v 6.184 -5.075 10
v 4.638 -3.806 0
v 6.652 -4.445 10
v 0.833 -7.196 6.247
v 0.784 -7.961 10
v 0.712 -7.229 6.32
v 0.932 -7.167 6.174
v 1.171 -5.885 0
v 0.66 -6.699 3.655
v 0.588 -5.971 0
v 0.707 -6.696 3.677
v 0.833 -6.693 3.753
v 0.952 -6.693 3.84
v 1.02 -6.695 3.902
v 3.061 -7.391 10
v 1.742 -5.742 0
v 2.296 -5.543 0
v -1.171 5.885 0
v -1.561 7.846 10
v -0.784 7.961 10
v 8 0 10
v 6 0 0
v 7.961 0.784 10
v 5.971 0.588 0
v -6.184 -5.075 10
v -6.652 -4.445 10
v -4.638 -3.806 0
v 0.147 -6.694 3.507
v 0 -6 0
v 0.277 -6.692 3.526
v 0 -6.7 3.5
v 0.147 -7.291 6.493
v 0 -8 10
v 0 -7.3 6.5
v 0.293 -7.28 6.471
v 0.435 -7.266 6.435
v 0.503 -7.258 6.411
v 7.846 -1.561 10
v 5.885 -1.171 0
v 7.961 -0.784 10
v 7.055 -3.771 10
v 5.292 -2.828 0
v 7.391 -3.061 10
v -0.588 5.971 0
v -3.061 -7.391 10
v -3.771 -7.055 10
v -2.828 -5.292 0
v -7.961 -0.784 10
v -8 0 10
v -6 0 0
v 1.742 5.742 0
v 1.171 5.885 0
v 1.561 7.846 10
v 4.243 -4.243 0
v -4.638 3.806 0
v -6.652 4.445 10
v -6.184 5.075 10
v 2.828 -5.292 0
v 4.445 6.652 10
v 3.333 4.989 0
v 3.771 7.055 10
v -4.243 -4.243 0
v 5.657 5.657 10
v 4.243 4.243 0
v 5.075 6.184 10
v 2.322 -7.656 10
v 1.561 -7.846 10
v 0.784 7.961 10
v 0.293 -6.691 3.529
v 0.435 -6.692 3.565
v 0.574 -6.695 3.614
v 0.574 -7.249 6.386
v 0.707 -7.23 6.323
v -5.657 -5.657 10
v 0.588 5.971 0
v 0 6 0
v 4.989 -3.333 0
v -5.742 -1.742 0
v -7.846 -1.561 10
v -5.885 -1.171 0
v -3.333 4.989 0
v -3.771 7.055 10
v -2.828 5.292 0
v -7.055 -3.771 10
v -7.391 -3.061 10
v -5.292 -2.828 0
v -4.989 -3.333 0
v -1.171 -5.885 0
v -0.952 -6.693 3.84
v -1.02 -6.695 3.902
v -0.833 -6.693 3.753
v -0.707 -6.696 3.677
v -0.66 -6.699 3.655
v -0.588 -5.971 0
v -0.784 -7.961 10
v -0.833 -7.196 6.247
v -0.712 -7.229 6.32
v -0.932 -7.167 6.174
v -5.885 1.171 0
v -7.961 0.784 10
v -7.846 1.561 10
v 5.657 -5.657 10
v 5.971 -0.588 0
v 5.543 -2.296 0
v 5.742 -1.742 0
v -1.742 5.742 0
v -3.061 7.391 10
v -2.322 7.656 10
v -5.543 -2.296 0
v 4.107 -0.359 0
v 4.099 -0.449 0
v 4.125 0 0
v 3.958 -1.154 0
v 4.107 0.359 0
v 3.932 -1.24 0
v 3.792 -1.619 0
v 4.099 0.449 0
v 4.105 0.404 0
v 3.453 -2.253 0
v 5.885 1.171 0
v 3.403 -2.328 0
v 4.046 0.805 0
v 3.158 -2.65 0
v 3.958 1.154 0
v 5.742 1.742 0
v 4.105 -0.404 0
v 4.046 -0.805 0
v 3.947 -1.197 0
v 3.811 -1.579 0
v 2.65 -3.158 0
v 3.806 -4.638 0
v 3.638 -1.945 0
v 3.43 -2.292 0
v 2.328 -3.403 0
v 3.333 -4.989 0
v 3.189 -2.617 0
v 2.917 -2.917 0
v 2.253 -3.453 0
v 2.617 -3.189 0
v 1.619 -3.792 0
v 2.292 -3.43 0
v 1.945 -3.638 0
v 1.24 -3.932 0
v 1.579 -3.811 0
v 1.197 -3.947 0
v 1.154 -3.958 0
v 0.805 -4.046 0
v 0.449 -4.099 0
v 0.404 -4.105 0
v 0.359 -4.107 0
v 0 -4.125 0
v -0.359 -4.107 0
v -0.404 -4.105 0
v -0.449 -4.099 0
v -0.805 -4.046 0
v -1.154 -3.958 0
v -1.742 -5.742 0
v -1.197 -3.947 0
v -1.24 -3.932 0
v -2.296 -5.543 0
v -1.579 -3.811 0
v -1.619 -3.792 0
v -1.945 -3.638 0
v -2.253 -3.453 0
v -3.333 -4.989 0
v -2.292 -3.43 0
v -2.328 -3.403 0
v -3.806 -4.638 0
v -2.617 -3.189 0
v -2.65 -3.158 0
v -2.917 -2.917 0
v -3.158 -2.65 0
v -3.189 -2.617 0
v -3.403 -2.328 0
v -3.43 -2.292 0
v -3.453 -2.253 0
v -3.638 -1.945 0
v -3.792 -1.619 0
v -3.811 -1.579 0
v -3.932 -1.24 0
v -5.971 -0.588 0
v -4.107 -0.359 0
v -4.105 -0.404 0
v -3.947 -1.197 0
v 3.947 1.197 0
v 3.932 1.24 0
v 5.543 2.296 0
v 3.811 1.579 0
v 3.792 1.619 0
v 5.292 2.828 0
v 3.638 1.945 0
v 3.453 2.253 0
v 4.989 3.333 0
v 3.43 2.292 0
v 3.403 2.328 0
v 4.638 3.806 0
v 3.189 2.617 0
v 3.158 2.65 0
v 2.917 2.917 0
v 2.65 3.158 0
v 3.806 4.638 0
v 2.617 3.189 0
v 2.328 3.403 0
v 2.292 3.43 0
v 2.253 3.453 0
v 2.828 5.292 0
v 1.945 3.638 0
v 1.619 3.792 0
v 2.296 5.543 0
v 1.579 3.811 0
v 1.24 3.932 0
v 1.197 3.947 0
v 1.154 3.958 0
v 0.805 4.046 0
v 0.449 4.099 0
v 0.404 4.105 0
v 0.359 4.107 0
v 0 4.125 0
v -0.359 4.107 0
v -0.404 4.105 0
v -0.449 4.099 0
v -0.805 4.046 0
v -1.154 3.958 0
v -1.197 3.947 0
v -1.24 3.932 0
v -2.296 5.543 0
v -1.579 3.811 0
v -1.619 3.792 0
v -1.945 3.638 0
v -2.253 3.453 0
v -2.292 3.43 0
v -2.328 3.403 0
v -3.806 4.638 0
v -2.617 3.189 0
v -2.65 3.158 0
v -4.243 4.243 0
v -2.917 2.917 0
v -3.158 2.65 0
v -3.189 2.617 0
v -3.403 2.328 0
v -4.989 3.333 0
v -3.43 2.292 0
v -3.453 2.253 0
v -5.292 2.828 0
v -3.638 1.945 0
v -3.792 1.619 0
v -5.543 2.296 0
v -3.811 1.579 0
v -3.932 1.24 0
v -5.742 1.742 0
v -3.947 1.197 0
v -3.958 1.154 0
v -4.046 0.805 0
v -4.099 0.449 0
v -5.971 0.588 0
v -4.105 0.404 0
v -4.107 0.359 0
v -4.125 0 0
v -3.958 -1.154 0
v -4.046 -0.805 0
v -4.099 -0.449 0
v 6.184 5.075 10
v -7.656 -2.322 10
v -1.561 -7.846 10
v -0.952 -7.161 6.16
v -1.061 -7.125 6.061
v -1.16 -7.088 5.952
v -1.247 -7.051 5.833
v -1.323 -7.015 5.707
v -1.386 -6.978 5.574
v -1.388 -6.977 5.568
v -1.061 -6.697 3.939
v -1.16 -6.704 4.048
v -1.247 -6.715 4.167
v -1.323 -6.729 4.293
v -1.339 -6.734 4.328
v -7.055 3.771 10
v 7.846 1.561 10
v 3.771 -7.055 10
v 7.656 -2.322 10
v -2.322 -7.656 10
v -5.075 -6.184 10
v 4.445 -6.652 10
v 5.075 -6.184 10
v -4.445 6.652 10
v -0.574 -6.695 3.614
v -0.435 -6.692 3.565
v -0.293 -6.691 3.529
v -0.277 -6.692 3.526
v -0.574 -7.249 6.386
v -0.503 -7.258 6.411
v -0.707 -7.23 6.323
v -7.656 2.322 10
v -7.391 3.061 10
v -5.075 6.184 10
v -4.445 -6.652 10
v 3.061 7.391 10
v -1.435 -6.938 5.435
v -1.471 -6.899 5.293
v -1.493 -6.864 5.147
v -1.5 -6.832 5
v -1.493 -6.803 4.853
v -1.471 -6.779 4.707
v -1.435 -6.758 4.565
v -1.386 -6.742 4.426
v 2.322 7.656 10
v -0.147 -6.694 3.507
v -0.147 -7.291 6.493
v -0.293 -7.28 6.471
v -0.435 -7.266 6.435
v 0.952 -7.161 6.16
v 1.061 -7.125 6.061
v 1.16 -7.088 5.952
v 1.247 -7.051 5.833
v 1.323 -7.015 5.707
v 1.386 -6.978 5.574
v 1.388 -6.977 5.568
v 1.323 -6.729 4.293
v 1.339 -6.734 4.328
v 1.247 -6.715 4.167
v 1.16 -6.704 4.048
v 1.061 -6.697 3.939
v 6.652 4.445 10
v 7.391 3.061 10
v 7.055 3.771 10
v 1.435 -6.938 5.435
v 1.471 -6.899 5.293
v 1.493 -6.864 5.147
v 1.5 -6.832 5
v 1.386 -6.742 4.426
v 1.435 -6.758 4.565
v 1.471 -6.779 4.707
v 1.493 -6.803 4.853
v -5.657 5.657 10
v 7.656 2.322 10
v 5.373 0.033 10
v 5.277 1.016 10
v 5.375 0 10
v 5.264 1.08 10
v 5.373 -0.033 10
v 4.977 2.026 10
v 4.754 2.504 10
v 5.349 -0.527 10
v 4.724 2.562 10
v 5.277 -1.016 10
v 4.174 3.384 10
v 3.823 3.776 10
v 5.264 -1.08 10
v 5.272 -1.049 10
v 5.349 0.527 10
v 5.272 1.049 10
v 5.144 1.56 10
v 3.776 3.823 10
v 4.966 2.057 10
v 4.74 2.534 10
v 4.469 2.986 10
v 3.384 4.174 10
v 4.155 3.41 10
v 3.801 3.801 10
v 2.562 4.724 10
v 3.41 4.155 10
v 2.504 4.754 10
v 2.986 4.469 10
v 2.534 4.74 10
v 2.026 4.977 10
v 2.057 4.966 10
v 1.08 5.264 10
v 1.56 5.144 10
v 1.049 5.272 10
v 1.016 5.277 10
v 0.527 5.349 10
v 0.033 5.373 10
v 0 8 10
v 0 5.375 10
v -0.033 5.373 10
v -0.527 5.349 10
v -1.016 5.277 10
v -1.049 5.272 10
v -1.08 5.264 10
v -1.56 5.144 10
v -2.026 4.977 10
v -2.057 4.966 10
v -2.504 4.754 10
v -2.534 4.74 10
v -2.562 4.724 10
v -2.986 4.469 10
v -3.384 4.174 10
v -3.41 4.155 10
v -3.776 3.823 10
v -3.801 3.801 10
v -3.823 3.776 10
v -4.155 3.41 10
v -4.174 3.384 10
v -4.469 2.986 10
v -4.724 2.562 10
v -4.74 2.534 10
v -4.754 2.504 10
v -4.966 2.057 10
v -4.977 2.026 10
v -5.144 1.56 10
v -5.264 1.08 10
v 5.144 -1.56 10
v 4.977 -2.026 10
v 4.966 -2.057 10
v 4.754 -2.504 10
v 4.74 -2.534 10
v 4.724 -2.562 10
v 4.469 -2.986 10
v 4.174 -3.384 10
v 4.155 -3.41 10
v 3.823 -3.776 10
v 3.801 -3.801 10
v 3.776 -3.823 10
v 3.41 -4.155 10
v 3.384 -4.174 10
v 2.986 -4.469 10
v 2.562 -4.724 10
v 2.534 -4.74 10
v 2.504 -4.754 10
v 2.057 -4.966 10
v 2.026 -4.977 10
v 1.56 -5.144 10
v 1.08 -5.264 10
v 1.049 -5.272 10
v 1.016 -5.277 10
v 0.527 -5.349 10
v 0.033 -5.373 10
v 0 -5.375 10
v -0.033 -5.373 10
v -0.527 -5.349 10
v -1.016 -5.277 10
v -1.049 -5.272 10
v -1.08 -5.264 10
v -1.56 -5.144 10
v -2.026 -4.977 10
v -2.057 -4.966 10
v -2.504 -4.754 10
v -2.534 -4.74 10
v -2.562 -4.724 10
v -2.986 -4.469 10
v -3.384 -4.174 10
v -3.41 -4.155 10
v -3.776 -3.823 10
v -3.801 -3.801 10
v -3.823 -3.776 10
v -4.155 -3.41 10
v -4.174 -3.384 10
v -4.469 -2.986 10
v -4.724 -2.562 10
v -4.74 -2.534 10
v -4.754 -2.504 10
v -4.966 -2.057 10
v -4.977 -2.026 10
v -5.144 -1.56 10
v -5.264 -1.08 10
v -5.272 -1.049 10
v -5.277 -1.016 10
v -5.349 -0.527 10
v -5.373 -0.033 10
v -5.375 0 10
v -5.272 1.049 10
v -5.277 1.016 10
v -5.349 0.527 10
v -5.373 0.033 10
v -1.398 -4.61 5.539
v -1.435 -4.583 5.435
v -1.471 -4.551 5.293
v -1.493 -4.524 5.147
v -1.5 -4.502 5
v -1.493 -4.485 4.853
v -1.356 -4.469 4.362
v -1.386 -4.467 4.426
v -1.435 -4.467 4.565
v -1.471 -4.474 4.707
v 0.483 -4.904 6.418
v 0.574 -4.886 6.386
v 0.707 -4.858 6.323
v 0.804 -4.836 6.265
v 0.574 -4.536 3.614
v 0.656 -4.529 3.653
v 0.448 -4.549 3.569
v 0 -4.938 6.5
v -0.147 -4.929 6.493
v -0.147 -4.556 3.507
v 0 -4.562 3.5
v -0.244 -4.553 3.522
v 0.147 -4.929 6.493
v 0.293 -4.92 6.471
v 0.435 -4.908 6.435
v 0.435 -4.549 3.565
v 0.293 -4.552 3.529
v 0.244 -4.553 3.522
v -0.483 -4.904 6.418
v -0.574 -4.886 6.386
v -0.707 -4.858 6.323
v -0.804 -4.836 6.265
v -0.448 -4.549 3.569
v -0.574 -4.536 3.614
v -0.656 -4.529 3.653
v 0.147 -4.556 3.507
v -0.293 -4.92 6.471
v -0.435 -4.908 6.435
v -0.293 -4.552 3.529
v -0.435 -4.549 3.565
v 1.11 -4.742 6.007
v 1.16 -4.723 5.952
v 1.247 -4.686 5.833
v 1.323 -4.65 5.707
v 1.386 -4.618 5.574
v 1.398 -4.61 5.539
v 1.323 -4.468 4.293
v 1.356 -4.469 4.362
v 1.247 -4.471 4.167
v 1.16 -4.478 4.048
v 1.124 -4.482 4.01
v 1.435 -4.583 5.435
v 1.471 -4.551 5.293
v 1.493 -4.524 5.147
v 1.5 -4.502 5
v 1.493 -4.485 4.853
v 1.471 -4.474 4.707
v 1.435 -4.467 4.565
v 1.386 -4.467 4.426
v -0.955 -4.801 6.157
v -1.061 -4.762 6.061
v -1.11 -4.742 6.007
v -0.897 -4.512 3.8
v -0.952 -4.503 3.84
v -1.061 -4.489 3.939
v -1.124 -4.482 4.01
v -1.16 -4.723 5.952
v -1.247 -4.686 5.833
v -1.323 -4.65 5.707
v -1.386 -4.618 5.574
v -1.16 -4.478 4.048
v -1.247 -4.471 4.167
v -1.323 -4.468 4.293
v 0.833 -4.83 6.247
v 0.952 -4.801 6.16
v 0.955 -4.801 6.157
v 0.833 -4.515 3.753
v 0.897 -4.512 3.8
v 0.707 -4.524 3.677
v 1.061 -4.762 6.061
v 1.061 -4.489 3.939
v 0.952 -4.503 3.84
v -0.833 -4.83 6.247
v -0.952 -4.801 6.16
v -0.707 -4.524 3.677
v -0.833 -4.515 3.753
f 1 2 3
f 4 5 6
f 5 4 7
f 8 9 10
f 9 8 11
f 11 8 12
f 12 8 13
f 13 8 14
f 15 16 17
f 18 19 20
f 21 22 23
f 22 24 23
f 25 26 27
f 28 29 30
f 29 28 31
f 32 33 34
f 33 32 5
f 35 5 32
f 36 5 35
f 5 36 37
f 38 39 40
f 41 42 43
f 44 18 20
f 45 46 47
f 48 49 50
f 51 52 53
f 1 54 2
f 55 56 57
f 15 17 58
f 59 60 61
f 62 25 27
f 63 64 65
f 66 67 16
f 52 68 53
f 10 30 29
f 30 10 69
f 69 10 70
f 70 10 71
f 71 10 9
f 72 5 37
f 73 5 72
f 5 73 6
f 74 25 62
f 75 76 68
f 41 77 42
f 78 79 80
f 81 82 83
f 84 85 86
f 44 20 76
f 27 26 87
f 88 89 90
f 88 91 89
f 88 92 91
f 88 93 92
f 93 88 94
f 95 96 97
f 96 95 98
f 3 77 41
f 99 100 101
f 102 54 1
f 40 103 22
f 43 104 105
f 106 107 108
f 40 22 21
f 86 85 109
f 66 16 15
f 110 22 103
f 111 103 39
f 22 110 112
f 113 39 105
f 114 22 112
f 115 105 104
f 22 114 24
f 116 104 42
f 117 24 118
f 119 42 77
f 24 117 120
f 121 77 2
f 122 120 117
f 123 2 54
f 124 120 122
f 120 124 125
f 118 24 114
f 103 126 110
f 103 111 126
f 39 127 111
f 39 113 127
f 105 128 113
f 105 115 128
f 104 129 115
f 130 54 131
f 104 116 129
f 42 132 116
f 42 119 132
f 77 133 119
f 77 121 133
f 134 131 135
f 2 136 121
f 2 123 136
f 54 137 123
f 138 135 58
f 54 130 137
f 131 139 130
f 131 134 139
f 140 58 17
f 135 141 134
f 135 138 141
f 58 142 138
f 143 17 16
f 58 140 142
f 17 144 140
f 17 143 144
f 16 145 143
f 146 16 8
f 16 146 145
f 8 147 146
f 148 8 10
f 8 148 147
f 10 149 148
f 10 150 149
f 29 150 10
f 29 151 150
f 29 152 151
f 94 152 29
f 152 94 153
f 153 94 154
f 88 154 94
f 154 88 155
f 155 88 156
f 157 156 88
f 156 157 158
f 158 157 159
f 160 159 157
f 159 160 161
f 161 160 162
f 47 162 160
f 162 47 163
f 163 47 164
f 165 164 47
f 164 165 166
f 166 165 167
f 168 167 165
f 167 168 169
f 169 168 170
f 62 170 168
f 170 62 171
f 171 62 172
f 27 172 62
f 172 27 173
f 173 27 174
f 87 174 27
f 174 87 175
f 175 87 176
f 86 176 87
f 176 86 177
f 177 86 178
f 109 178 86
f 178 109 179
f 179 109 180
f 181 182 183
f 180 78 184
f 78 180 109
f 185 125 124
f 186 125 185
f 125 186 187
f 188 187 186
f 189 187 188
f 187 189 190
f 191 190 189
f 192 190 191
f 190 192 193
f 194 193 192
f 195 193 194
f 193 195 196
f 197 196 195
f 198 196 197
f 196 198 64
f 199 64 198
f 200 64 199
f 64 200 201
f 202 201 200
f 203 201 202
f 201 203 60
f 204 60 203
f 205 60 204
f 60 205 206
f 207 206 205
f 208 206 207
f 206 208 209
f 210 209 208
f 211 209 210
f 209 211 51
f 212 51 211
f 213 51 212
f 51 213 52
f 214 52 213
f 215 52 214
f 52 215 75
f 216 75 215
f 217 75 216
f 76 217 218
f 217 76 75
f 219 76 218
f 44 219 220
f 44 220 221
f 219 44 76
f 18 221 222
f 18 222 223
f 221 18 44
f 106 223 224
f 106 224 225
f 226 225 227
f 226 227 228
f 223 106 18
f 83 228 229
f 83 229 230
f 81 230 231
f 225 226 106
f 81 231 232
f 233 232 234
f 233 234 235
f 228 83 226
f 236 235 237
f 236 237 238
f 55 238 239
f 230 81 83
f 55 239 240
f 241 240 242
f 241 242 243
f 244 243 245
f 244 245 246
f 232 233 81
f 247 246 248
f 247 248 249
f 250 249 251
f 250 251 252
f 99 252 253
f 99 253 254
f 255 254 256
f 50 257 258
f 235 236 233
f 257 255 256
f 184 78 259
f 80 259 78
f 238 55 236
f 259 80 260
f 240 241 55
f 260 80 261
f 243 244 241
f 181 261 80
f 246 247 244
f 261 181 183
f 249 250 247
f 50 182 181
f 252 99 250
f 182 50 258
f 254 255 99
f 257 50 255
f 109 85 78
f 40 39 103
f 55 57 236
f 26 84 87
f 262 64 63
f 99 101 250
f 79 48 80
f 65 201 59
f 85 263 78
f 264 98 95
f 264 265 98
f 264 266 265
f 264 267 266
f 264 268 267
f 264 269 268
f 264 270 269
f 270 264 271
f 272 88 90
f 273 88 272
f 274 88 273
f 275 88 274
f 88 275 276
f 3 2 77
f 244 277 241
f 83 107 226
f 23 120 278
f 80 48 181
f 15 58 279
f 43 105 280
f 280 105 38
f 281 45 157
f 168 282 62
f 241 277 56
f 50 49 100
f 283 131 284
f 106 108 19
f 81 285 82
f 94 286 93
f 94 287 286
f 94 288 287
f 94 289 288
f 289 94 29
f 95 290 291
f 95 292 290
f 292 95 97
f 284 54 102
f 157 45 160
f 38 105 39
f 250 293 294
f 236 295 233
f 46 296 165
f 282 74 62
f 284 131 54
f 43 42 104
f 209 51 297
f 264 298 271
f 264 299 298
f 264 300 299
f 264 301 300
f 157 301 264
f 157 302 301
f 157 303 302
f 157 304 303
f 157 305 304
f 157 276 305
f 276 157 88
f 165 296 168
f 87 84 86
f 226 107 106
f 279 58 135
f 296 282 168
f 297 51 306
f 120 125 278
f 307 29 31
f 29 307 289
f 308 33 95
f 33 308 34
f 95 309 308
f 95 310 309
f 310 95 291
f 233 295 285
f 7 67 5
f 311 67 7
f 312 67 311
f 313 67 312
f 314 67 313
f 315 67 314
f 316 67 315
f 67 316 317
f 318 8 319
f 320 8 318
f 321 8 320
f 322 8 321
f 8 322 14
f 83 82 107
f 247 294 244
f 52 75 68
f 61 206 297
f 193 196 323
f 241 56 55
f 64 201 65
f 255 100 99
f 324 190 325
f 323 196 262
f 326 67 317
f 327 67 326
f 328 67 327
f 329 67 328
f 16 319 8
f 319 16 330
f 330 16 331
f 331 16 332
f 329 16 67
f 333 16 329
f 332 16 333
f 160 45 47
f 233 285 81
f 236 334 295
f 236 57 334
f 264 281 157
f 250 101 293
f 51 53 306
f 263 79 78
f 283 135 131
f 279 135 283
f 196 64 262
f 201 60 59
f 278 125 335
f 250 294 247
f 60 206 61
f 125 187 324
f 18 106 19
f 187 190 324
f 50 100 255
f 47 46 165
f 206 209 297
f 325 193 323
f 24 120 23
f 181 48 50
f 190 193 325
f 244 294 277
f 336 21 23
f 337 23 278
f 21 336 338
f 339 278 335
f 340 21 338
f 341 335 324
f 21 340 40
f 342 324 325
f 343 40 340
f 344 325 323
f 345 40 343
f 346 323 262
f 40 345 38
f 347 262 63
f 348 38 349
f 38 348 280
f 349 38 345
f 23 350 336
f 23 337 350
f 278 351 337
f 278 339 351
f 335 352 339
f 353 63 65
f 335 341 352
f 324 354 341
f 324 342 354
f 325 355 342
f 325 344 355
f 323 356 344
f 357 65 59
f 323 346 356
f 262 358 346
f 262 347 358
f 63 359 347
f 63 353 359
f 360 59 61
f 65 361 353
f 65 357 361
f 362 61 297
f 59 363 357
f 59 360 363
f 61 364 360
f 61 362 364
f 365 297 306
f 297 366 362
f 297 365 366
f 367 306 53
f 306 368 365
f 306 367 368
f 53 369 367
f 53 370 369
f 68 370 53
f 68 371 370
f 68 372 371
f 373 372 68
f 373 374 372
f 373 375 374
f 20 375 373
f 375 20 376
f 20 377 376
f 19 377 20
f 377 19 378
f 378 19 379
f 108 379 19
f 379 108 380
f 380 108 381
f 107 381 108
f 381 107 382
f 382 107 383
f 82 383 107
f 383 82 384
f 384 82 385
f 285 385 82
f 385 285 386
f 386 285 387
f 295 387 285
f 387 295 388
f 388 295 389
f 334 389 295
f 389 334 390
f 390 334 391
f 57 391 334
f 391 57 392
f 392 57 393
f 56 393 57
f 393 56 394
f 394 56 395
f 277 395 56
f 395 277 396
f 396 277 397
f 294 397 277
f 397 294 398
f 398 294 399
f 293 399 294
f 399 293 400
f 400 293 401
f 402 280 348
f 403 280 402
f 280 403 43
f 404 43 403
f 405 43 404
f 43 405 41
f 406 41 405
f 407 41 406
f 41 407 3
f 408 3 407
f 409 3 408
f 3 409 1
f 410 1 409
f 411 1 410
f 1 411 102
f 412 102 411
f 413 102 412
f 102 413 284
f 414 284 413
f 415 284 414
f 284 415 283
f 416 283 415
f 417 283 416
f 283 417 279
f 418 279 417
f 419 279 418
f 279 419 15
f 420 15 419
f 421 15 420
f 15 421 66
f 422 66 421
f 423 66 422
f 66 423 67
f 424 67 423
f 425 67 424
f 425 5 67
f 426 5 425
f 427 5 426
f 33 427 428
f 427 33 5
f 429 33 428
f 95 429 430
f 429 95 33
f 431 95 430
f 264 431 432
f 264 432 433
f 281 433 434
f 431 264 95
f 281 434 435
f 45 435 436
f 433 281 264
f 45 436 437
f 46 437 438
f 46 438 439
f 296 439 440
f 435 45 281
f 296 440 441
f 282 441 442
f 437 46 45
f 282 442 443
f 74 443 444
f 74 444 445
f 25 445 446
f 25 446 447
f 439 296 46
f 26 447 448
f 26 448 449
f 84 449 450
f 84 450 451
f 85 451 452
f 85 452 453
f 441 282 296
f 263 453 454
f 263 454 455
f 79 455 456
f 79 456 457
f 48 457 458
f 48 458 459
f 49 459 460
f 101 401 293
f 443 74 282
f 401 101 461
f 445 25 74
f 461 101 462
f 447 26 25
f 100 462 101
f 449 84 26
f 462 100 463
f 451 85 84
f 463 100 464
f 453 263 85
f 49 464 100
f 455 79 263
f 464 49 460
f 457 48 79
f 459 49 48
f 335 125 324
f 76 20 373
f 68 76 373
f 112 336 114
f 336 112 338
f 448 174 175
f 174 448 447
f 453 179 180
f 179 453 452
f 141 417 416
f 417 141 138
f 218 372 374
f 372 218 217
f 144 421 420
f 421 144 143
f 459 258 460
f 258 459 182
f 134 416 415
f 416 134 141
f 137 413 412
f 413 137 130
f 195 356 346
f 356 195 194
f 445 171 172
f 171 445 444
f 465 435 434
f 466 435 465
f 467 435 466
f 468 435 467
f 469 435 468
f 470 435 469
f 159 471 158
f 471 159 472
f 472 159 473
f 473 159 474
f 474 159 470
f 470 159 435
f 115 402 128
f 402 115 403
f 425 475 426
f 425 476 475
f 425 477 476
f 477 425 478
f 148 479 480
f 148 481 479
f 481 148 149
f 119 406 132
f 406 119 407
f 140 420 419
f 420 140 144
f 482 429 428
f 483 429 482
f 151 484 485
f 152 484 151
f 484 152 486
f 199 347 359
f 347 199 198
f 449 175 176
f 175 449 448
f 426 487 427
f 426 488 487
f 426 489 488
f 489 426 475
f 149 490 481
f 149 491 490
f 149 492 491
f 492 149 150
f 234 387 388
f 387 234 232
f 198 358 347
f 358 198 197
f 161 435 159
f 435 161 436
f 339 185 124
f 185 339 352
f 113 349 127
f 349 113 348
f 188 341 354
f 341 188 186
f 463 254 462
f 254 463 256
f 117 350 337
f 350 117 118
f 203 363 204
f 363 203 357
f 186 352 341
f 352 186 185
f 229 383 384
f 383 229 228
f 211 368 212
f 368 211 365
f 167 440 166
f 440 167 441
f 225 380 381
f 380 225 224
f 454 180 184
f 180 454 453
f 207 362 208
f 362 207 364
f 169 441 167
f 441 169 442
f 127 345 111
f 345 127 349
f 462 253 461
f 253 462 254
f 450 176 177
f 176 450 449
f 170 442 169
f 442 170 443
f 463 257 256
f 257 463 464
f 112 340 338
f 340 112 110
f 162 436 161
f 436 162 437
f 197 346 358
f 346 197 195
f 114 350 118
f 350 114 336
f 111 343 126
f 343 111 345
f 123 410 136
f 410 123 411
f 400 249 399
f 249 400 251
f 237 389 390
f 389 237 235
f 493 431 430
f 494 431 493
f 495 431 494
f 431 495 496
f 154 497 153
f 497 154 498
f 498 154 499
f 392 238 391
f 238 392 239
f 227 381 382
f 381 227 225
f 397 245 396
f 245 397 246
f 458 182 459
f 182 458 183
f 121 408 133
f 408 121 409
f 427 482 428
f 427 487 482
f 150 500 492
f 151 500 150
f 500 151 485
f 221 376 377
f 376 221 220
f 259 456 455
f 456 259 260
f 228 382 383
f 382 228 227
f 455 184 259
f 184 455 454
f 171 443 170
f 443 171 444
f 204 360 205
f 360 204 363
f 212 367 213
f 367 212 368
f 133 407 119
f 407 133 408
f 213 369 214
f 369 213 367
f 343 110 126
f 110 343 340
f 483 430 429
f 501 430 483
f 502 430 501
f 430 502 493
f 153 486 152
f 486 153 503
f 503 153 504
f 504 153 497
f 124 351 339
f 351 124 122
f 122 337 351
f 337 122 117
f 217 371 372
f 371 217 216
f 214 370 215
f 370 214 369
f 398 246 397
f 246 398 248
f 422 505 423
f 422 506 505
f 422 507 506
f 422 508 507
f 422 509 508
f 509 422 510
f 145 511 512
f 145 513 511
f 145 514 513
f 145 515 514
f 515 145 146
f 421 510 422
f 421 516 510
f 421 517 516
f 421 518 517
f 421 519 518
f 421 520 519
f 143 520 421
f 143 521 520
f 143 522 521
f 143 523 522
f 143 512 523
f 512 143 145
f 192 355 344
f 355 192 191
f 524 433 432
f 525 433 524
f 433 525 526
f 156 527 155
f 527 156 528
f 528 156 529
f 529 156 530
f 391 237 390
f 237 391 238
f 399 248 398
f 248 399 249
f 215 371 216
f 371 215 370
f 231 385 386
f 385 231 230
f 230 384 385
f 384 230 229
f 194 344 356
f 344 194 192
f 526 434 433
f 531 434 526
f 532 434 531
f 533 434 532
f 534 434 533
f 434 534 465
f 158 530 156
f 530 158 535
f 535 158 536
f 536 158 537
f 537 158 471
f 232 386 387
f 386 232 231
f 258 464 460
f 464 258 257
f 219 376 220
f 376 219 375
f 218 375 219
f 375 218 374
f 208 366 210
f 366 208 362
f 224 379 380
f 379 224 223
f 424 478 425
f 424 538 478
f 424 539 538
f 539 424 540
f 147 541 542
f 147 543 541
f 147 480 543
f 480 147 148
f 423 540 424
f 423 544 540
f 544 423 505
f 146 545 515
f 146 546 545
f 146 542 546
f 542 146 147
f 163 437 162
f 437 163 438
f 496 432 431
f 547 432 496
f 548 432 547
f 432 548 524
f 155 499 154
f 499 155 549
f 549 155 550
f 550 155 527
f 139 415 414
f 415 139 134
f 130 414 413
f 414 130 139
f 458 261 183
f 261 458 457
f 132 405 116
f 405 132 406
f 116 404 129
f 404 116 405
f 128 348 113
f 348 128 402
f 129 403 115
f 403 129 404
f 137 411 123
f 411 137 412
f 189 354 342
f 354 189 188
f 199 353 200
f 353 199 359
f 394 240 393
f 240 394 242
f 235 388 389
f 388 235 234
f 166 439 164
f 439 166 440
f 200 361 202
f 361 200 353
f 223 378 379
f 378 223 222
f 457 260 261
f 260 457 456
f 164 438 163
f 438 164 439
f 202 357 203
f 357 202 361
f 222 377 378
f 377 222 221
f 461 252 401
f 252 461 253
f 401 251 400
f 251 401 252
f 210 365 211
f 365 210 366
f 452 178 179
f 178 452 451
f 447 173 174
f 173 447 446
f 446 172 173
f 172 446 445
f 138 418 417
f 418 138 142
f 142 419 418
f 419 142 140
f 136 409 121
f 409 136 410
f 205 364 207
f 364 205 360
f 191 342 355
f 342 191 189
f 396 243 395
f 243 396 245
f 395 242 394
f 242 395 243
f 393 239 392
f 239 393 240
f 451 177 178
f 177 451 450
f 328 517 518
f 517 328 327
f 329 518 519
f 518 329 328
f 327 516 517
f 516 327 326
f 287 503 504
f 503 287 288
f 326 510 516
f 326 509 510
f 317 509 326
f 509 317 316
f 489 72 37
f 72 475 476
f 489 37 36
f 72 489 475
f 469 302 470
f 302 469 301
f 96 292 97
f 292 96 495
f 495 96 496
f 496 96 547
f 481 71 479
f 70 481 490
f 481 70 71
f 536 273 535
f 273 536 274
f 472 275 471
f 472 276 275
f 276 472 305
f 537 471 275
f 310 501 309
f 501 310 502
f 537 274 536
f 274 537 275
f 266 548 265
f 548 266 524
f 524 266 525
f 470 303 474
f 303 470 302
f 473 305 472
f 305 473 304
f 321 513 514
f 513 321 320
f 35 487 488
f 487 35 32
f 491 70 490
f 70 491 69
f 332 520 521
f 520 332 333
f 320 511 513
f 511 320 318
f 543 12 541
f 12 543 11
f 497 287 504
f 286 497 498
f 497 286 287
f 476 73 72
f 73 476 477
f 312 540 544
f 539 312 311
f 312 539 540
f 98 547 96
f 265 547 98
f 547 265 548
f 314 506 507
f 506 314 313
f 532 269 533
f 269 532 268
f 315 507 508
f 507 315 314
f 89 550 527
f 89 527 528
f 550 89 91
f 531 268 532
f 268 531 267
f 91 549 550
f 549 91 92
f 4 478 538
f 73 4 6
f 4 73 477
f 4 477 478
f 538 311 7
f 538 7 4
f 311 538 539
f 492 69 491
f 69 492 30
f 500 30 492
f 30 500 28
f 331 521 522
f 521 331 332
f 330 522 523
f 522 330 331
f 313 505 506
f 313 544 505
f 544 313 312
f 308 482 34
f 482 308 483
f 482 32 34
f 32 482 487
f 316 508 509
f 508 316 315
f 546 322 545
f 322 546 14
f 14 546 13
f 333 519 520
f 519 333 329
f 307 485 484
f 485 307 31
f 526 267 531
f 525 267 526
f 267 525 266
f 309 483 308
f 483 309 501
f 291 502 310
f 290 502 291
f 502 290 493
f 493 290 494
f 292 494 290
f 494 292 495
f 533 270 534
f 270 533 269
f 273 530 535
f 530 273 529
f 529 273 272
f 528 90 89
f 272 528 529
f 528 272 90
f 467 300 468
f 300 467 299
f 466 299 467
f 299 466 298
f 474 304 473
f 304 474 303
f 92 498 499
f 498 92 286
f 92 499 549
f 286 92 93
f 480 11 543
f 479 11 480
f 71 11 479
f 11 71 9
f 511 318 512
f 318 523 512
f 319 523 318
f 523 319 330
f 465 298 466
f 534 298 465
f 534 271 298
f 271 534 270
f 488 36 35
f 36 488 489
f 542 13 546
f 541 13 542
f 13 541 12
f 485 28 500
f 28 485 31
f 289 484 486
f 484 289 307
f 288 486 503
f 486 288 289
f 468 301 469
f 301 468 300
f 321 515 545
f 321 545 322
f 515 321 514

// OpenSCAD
$fn = 64;

difference(){

cylinder(r1=6,r2=8,h=10);
translate([0,0,-1])cylinder(r1=8/2,r2=11/2,h=12);
translate([0,0,5]) rotate([90,0,0])cylinder(r=1.5,h=10);
}
